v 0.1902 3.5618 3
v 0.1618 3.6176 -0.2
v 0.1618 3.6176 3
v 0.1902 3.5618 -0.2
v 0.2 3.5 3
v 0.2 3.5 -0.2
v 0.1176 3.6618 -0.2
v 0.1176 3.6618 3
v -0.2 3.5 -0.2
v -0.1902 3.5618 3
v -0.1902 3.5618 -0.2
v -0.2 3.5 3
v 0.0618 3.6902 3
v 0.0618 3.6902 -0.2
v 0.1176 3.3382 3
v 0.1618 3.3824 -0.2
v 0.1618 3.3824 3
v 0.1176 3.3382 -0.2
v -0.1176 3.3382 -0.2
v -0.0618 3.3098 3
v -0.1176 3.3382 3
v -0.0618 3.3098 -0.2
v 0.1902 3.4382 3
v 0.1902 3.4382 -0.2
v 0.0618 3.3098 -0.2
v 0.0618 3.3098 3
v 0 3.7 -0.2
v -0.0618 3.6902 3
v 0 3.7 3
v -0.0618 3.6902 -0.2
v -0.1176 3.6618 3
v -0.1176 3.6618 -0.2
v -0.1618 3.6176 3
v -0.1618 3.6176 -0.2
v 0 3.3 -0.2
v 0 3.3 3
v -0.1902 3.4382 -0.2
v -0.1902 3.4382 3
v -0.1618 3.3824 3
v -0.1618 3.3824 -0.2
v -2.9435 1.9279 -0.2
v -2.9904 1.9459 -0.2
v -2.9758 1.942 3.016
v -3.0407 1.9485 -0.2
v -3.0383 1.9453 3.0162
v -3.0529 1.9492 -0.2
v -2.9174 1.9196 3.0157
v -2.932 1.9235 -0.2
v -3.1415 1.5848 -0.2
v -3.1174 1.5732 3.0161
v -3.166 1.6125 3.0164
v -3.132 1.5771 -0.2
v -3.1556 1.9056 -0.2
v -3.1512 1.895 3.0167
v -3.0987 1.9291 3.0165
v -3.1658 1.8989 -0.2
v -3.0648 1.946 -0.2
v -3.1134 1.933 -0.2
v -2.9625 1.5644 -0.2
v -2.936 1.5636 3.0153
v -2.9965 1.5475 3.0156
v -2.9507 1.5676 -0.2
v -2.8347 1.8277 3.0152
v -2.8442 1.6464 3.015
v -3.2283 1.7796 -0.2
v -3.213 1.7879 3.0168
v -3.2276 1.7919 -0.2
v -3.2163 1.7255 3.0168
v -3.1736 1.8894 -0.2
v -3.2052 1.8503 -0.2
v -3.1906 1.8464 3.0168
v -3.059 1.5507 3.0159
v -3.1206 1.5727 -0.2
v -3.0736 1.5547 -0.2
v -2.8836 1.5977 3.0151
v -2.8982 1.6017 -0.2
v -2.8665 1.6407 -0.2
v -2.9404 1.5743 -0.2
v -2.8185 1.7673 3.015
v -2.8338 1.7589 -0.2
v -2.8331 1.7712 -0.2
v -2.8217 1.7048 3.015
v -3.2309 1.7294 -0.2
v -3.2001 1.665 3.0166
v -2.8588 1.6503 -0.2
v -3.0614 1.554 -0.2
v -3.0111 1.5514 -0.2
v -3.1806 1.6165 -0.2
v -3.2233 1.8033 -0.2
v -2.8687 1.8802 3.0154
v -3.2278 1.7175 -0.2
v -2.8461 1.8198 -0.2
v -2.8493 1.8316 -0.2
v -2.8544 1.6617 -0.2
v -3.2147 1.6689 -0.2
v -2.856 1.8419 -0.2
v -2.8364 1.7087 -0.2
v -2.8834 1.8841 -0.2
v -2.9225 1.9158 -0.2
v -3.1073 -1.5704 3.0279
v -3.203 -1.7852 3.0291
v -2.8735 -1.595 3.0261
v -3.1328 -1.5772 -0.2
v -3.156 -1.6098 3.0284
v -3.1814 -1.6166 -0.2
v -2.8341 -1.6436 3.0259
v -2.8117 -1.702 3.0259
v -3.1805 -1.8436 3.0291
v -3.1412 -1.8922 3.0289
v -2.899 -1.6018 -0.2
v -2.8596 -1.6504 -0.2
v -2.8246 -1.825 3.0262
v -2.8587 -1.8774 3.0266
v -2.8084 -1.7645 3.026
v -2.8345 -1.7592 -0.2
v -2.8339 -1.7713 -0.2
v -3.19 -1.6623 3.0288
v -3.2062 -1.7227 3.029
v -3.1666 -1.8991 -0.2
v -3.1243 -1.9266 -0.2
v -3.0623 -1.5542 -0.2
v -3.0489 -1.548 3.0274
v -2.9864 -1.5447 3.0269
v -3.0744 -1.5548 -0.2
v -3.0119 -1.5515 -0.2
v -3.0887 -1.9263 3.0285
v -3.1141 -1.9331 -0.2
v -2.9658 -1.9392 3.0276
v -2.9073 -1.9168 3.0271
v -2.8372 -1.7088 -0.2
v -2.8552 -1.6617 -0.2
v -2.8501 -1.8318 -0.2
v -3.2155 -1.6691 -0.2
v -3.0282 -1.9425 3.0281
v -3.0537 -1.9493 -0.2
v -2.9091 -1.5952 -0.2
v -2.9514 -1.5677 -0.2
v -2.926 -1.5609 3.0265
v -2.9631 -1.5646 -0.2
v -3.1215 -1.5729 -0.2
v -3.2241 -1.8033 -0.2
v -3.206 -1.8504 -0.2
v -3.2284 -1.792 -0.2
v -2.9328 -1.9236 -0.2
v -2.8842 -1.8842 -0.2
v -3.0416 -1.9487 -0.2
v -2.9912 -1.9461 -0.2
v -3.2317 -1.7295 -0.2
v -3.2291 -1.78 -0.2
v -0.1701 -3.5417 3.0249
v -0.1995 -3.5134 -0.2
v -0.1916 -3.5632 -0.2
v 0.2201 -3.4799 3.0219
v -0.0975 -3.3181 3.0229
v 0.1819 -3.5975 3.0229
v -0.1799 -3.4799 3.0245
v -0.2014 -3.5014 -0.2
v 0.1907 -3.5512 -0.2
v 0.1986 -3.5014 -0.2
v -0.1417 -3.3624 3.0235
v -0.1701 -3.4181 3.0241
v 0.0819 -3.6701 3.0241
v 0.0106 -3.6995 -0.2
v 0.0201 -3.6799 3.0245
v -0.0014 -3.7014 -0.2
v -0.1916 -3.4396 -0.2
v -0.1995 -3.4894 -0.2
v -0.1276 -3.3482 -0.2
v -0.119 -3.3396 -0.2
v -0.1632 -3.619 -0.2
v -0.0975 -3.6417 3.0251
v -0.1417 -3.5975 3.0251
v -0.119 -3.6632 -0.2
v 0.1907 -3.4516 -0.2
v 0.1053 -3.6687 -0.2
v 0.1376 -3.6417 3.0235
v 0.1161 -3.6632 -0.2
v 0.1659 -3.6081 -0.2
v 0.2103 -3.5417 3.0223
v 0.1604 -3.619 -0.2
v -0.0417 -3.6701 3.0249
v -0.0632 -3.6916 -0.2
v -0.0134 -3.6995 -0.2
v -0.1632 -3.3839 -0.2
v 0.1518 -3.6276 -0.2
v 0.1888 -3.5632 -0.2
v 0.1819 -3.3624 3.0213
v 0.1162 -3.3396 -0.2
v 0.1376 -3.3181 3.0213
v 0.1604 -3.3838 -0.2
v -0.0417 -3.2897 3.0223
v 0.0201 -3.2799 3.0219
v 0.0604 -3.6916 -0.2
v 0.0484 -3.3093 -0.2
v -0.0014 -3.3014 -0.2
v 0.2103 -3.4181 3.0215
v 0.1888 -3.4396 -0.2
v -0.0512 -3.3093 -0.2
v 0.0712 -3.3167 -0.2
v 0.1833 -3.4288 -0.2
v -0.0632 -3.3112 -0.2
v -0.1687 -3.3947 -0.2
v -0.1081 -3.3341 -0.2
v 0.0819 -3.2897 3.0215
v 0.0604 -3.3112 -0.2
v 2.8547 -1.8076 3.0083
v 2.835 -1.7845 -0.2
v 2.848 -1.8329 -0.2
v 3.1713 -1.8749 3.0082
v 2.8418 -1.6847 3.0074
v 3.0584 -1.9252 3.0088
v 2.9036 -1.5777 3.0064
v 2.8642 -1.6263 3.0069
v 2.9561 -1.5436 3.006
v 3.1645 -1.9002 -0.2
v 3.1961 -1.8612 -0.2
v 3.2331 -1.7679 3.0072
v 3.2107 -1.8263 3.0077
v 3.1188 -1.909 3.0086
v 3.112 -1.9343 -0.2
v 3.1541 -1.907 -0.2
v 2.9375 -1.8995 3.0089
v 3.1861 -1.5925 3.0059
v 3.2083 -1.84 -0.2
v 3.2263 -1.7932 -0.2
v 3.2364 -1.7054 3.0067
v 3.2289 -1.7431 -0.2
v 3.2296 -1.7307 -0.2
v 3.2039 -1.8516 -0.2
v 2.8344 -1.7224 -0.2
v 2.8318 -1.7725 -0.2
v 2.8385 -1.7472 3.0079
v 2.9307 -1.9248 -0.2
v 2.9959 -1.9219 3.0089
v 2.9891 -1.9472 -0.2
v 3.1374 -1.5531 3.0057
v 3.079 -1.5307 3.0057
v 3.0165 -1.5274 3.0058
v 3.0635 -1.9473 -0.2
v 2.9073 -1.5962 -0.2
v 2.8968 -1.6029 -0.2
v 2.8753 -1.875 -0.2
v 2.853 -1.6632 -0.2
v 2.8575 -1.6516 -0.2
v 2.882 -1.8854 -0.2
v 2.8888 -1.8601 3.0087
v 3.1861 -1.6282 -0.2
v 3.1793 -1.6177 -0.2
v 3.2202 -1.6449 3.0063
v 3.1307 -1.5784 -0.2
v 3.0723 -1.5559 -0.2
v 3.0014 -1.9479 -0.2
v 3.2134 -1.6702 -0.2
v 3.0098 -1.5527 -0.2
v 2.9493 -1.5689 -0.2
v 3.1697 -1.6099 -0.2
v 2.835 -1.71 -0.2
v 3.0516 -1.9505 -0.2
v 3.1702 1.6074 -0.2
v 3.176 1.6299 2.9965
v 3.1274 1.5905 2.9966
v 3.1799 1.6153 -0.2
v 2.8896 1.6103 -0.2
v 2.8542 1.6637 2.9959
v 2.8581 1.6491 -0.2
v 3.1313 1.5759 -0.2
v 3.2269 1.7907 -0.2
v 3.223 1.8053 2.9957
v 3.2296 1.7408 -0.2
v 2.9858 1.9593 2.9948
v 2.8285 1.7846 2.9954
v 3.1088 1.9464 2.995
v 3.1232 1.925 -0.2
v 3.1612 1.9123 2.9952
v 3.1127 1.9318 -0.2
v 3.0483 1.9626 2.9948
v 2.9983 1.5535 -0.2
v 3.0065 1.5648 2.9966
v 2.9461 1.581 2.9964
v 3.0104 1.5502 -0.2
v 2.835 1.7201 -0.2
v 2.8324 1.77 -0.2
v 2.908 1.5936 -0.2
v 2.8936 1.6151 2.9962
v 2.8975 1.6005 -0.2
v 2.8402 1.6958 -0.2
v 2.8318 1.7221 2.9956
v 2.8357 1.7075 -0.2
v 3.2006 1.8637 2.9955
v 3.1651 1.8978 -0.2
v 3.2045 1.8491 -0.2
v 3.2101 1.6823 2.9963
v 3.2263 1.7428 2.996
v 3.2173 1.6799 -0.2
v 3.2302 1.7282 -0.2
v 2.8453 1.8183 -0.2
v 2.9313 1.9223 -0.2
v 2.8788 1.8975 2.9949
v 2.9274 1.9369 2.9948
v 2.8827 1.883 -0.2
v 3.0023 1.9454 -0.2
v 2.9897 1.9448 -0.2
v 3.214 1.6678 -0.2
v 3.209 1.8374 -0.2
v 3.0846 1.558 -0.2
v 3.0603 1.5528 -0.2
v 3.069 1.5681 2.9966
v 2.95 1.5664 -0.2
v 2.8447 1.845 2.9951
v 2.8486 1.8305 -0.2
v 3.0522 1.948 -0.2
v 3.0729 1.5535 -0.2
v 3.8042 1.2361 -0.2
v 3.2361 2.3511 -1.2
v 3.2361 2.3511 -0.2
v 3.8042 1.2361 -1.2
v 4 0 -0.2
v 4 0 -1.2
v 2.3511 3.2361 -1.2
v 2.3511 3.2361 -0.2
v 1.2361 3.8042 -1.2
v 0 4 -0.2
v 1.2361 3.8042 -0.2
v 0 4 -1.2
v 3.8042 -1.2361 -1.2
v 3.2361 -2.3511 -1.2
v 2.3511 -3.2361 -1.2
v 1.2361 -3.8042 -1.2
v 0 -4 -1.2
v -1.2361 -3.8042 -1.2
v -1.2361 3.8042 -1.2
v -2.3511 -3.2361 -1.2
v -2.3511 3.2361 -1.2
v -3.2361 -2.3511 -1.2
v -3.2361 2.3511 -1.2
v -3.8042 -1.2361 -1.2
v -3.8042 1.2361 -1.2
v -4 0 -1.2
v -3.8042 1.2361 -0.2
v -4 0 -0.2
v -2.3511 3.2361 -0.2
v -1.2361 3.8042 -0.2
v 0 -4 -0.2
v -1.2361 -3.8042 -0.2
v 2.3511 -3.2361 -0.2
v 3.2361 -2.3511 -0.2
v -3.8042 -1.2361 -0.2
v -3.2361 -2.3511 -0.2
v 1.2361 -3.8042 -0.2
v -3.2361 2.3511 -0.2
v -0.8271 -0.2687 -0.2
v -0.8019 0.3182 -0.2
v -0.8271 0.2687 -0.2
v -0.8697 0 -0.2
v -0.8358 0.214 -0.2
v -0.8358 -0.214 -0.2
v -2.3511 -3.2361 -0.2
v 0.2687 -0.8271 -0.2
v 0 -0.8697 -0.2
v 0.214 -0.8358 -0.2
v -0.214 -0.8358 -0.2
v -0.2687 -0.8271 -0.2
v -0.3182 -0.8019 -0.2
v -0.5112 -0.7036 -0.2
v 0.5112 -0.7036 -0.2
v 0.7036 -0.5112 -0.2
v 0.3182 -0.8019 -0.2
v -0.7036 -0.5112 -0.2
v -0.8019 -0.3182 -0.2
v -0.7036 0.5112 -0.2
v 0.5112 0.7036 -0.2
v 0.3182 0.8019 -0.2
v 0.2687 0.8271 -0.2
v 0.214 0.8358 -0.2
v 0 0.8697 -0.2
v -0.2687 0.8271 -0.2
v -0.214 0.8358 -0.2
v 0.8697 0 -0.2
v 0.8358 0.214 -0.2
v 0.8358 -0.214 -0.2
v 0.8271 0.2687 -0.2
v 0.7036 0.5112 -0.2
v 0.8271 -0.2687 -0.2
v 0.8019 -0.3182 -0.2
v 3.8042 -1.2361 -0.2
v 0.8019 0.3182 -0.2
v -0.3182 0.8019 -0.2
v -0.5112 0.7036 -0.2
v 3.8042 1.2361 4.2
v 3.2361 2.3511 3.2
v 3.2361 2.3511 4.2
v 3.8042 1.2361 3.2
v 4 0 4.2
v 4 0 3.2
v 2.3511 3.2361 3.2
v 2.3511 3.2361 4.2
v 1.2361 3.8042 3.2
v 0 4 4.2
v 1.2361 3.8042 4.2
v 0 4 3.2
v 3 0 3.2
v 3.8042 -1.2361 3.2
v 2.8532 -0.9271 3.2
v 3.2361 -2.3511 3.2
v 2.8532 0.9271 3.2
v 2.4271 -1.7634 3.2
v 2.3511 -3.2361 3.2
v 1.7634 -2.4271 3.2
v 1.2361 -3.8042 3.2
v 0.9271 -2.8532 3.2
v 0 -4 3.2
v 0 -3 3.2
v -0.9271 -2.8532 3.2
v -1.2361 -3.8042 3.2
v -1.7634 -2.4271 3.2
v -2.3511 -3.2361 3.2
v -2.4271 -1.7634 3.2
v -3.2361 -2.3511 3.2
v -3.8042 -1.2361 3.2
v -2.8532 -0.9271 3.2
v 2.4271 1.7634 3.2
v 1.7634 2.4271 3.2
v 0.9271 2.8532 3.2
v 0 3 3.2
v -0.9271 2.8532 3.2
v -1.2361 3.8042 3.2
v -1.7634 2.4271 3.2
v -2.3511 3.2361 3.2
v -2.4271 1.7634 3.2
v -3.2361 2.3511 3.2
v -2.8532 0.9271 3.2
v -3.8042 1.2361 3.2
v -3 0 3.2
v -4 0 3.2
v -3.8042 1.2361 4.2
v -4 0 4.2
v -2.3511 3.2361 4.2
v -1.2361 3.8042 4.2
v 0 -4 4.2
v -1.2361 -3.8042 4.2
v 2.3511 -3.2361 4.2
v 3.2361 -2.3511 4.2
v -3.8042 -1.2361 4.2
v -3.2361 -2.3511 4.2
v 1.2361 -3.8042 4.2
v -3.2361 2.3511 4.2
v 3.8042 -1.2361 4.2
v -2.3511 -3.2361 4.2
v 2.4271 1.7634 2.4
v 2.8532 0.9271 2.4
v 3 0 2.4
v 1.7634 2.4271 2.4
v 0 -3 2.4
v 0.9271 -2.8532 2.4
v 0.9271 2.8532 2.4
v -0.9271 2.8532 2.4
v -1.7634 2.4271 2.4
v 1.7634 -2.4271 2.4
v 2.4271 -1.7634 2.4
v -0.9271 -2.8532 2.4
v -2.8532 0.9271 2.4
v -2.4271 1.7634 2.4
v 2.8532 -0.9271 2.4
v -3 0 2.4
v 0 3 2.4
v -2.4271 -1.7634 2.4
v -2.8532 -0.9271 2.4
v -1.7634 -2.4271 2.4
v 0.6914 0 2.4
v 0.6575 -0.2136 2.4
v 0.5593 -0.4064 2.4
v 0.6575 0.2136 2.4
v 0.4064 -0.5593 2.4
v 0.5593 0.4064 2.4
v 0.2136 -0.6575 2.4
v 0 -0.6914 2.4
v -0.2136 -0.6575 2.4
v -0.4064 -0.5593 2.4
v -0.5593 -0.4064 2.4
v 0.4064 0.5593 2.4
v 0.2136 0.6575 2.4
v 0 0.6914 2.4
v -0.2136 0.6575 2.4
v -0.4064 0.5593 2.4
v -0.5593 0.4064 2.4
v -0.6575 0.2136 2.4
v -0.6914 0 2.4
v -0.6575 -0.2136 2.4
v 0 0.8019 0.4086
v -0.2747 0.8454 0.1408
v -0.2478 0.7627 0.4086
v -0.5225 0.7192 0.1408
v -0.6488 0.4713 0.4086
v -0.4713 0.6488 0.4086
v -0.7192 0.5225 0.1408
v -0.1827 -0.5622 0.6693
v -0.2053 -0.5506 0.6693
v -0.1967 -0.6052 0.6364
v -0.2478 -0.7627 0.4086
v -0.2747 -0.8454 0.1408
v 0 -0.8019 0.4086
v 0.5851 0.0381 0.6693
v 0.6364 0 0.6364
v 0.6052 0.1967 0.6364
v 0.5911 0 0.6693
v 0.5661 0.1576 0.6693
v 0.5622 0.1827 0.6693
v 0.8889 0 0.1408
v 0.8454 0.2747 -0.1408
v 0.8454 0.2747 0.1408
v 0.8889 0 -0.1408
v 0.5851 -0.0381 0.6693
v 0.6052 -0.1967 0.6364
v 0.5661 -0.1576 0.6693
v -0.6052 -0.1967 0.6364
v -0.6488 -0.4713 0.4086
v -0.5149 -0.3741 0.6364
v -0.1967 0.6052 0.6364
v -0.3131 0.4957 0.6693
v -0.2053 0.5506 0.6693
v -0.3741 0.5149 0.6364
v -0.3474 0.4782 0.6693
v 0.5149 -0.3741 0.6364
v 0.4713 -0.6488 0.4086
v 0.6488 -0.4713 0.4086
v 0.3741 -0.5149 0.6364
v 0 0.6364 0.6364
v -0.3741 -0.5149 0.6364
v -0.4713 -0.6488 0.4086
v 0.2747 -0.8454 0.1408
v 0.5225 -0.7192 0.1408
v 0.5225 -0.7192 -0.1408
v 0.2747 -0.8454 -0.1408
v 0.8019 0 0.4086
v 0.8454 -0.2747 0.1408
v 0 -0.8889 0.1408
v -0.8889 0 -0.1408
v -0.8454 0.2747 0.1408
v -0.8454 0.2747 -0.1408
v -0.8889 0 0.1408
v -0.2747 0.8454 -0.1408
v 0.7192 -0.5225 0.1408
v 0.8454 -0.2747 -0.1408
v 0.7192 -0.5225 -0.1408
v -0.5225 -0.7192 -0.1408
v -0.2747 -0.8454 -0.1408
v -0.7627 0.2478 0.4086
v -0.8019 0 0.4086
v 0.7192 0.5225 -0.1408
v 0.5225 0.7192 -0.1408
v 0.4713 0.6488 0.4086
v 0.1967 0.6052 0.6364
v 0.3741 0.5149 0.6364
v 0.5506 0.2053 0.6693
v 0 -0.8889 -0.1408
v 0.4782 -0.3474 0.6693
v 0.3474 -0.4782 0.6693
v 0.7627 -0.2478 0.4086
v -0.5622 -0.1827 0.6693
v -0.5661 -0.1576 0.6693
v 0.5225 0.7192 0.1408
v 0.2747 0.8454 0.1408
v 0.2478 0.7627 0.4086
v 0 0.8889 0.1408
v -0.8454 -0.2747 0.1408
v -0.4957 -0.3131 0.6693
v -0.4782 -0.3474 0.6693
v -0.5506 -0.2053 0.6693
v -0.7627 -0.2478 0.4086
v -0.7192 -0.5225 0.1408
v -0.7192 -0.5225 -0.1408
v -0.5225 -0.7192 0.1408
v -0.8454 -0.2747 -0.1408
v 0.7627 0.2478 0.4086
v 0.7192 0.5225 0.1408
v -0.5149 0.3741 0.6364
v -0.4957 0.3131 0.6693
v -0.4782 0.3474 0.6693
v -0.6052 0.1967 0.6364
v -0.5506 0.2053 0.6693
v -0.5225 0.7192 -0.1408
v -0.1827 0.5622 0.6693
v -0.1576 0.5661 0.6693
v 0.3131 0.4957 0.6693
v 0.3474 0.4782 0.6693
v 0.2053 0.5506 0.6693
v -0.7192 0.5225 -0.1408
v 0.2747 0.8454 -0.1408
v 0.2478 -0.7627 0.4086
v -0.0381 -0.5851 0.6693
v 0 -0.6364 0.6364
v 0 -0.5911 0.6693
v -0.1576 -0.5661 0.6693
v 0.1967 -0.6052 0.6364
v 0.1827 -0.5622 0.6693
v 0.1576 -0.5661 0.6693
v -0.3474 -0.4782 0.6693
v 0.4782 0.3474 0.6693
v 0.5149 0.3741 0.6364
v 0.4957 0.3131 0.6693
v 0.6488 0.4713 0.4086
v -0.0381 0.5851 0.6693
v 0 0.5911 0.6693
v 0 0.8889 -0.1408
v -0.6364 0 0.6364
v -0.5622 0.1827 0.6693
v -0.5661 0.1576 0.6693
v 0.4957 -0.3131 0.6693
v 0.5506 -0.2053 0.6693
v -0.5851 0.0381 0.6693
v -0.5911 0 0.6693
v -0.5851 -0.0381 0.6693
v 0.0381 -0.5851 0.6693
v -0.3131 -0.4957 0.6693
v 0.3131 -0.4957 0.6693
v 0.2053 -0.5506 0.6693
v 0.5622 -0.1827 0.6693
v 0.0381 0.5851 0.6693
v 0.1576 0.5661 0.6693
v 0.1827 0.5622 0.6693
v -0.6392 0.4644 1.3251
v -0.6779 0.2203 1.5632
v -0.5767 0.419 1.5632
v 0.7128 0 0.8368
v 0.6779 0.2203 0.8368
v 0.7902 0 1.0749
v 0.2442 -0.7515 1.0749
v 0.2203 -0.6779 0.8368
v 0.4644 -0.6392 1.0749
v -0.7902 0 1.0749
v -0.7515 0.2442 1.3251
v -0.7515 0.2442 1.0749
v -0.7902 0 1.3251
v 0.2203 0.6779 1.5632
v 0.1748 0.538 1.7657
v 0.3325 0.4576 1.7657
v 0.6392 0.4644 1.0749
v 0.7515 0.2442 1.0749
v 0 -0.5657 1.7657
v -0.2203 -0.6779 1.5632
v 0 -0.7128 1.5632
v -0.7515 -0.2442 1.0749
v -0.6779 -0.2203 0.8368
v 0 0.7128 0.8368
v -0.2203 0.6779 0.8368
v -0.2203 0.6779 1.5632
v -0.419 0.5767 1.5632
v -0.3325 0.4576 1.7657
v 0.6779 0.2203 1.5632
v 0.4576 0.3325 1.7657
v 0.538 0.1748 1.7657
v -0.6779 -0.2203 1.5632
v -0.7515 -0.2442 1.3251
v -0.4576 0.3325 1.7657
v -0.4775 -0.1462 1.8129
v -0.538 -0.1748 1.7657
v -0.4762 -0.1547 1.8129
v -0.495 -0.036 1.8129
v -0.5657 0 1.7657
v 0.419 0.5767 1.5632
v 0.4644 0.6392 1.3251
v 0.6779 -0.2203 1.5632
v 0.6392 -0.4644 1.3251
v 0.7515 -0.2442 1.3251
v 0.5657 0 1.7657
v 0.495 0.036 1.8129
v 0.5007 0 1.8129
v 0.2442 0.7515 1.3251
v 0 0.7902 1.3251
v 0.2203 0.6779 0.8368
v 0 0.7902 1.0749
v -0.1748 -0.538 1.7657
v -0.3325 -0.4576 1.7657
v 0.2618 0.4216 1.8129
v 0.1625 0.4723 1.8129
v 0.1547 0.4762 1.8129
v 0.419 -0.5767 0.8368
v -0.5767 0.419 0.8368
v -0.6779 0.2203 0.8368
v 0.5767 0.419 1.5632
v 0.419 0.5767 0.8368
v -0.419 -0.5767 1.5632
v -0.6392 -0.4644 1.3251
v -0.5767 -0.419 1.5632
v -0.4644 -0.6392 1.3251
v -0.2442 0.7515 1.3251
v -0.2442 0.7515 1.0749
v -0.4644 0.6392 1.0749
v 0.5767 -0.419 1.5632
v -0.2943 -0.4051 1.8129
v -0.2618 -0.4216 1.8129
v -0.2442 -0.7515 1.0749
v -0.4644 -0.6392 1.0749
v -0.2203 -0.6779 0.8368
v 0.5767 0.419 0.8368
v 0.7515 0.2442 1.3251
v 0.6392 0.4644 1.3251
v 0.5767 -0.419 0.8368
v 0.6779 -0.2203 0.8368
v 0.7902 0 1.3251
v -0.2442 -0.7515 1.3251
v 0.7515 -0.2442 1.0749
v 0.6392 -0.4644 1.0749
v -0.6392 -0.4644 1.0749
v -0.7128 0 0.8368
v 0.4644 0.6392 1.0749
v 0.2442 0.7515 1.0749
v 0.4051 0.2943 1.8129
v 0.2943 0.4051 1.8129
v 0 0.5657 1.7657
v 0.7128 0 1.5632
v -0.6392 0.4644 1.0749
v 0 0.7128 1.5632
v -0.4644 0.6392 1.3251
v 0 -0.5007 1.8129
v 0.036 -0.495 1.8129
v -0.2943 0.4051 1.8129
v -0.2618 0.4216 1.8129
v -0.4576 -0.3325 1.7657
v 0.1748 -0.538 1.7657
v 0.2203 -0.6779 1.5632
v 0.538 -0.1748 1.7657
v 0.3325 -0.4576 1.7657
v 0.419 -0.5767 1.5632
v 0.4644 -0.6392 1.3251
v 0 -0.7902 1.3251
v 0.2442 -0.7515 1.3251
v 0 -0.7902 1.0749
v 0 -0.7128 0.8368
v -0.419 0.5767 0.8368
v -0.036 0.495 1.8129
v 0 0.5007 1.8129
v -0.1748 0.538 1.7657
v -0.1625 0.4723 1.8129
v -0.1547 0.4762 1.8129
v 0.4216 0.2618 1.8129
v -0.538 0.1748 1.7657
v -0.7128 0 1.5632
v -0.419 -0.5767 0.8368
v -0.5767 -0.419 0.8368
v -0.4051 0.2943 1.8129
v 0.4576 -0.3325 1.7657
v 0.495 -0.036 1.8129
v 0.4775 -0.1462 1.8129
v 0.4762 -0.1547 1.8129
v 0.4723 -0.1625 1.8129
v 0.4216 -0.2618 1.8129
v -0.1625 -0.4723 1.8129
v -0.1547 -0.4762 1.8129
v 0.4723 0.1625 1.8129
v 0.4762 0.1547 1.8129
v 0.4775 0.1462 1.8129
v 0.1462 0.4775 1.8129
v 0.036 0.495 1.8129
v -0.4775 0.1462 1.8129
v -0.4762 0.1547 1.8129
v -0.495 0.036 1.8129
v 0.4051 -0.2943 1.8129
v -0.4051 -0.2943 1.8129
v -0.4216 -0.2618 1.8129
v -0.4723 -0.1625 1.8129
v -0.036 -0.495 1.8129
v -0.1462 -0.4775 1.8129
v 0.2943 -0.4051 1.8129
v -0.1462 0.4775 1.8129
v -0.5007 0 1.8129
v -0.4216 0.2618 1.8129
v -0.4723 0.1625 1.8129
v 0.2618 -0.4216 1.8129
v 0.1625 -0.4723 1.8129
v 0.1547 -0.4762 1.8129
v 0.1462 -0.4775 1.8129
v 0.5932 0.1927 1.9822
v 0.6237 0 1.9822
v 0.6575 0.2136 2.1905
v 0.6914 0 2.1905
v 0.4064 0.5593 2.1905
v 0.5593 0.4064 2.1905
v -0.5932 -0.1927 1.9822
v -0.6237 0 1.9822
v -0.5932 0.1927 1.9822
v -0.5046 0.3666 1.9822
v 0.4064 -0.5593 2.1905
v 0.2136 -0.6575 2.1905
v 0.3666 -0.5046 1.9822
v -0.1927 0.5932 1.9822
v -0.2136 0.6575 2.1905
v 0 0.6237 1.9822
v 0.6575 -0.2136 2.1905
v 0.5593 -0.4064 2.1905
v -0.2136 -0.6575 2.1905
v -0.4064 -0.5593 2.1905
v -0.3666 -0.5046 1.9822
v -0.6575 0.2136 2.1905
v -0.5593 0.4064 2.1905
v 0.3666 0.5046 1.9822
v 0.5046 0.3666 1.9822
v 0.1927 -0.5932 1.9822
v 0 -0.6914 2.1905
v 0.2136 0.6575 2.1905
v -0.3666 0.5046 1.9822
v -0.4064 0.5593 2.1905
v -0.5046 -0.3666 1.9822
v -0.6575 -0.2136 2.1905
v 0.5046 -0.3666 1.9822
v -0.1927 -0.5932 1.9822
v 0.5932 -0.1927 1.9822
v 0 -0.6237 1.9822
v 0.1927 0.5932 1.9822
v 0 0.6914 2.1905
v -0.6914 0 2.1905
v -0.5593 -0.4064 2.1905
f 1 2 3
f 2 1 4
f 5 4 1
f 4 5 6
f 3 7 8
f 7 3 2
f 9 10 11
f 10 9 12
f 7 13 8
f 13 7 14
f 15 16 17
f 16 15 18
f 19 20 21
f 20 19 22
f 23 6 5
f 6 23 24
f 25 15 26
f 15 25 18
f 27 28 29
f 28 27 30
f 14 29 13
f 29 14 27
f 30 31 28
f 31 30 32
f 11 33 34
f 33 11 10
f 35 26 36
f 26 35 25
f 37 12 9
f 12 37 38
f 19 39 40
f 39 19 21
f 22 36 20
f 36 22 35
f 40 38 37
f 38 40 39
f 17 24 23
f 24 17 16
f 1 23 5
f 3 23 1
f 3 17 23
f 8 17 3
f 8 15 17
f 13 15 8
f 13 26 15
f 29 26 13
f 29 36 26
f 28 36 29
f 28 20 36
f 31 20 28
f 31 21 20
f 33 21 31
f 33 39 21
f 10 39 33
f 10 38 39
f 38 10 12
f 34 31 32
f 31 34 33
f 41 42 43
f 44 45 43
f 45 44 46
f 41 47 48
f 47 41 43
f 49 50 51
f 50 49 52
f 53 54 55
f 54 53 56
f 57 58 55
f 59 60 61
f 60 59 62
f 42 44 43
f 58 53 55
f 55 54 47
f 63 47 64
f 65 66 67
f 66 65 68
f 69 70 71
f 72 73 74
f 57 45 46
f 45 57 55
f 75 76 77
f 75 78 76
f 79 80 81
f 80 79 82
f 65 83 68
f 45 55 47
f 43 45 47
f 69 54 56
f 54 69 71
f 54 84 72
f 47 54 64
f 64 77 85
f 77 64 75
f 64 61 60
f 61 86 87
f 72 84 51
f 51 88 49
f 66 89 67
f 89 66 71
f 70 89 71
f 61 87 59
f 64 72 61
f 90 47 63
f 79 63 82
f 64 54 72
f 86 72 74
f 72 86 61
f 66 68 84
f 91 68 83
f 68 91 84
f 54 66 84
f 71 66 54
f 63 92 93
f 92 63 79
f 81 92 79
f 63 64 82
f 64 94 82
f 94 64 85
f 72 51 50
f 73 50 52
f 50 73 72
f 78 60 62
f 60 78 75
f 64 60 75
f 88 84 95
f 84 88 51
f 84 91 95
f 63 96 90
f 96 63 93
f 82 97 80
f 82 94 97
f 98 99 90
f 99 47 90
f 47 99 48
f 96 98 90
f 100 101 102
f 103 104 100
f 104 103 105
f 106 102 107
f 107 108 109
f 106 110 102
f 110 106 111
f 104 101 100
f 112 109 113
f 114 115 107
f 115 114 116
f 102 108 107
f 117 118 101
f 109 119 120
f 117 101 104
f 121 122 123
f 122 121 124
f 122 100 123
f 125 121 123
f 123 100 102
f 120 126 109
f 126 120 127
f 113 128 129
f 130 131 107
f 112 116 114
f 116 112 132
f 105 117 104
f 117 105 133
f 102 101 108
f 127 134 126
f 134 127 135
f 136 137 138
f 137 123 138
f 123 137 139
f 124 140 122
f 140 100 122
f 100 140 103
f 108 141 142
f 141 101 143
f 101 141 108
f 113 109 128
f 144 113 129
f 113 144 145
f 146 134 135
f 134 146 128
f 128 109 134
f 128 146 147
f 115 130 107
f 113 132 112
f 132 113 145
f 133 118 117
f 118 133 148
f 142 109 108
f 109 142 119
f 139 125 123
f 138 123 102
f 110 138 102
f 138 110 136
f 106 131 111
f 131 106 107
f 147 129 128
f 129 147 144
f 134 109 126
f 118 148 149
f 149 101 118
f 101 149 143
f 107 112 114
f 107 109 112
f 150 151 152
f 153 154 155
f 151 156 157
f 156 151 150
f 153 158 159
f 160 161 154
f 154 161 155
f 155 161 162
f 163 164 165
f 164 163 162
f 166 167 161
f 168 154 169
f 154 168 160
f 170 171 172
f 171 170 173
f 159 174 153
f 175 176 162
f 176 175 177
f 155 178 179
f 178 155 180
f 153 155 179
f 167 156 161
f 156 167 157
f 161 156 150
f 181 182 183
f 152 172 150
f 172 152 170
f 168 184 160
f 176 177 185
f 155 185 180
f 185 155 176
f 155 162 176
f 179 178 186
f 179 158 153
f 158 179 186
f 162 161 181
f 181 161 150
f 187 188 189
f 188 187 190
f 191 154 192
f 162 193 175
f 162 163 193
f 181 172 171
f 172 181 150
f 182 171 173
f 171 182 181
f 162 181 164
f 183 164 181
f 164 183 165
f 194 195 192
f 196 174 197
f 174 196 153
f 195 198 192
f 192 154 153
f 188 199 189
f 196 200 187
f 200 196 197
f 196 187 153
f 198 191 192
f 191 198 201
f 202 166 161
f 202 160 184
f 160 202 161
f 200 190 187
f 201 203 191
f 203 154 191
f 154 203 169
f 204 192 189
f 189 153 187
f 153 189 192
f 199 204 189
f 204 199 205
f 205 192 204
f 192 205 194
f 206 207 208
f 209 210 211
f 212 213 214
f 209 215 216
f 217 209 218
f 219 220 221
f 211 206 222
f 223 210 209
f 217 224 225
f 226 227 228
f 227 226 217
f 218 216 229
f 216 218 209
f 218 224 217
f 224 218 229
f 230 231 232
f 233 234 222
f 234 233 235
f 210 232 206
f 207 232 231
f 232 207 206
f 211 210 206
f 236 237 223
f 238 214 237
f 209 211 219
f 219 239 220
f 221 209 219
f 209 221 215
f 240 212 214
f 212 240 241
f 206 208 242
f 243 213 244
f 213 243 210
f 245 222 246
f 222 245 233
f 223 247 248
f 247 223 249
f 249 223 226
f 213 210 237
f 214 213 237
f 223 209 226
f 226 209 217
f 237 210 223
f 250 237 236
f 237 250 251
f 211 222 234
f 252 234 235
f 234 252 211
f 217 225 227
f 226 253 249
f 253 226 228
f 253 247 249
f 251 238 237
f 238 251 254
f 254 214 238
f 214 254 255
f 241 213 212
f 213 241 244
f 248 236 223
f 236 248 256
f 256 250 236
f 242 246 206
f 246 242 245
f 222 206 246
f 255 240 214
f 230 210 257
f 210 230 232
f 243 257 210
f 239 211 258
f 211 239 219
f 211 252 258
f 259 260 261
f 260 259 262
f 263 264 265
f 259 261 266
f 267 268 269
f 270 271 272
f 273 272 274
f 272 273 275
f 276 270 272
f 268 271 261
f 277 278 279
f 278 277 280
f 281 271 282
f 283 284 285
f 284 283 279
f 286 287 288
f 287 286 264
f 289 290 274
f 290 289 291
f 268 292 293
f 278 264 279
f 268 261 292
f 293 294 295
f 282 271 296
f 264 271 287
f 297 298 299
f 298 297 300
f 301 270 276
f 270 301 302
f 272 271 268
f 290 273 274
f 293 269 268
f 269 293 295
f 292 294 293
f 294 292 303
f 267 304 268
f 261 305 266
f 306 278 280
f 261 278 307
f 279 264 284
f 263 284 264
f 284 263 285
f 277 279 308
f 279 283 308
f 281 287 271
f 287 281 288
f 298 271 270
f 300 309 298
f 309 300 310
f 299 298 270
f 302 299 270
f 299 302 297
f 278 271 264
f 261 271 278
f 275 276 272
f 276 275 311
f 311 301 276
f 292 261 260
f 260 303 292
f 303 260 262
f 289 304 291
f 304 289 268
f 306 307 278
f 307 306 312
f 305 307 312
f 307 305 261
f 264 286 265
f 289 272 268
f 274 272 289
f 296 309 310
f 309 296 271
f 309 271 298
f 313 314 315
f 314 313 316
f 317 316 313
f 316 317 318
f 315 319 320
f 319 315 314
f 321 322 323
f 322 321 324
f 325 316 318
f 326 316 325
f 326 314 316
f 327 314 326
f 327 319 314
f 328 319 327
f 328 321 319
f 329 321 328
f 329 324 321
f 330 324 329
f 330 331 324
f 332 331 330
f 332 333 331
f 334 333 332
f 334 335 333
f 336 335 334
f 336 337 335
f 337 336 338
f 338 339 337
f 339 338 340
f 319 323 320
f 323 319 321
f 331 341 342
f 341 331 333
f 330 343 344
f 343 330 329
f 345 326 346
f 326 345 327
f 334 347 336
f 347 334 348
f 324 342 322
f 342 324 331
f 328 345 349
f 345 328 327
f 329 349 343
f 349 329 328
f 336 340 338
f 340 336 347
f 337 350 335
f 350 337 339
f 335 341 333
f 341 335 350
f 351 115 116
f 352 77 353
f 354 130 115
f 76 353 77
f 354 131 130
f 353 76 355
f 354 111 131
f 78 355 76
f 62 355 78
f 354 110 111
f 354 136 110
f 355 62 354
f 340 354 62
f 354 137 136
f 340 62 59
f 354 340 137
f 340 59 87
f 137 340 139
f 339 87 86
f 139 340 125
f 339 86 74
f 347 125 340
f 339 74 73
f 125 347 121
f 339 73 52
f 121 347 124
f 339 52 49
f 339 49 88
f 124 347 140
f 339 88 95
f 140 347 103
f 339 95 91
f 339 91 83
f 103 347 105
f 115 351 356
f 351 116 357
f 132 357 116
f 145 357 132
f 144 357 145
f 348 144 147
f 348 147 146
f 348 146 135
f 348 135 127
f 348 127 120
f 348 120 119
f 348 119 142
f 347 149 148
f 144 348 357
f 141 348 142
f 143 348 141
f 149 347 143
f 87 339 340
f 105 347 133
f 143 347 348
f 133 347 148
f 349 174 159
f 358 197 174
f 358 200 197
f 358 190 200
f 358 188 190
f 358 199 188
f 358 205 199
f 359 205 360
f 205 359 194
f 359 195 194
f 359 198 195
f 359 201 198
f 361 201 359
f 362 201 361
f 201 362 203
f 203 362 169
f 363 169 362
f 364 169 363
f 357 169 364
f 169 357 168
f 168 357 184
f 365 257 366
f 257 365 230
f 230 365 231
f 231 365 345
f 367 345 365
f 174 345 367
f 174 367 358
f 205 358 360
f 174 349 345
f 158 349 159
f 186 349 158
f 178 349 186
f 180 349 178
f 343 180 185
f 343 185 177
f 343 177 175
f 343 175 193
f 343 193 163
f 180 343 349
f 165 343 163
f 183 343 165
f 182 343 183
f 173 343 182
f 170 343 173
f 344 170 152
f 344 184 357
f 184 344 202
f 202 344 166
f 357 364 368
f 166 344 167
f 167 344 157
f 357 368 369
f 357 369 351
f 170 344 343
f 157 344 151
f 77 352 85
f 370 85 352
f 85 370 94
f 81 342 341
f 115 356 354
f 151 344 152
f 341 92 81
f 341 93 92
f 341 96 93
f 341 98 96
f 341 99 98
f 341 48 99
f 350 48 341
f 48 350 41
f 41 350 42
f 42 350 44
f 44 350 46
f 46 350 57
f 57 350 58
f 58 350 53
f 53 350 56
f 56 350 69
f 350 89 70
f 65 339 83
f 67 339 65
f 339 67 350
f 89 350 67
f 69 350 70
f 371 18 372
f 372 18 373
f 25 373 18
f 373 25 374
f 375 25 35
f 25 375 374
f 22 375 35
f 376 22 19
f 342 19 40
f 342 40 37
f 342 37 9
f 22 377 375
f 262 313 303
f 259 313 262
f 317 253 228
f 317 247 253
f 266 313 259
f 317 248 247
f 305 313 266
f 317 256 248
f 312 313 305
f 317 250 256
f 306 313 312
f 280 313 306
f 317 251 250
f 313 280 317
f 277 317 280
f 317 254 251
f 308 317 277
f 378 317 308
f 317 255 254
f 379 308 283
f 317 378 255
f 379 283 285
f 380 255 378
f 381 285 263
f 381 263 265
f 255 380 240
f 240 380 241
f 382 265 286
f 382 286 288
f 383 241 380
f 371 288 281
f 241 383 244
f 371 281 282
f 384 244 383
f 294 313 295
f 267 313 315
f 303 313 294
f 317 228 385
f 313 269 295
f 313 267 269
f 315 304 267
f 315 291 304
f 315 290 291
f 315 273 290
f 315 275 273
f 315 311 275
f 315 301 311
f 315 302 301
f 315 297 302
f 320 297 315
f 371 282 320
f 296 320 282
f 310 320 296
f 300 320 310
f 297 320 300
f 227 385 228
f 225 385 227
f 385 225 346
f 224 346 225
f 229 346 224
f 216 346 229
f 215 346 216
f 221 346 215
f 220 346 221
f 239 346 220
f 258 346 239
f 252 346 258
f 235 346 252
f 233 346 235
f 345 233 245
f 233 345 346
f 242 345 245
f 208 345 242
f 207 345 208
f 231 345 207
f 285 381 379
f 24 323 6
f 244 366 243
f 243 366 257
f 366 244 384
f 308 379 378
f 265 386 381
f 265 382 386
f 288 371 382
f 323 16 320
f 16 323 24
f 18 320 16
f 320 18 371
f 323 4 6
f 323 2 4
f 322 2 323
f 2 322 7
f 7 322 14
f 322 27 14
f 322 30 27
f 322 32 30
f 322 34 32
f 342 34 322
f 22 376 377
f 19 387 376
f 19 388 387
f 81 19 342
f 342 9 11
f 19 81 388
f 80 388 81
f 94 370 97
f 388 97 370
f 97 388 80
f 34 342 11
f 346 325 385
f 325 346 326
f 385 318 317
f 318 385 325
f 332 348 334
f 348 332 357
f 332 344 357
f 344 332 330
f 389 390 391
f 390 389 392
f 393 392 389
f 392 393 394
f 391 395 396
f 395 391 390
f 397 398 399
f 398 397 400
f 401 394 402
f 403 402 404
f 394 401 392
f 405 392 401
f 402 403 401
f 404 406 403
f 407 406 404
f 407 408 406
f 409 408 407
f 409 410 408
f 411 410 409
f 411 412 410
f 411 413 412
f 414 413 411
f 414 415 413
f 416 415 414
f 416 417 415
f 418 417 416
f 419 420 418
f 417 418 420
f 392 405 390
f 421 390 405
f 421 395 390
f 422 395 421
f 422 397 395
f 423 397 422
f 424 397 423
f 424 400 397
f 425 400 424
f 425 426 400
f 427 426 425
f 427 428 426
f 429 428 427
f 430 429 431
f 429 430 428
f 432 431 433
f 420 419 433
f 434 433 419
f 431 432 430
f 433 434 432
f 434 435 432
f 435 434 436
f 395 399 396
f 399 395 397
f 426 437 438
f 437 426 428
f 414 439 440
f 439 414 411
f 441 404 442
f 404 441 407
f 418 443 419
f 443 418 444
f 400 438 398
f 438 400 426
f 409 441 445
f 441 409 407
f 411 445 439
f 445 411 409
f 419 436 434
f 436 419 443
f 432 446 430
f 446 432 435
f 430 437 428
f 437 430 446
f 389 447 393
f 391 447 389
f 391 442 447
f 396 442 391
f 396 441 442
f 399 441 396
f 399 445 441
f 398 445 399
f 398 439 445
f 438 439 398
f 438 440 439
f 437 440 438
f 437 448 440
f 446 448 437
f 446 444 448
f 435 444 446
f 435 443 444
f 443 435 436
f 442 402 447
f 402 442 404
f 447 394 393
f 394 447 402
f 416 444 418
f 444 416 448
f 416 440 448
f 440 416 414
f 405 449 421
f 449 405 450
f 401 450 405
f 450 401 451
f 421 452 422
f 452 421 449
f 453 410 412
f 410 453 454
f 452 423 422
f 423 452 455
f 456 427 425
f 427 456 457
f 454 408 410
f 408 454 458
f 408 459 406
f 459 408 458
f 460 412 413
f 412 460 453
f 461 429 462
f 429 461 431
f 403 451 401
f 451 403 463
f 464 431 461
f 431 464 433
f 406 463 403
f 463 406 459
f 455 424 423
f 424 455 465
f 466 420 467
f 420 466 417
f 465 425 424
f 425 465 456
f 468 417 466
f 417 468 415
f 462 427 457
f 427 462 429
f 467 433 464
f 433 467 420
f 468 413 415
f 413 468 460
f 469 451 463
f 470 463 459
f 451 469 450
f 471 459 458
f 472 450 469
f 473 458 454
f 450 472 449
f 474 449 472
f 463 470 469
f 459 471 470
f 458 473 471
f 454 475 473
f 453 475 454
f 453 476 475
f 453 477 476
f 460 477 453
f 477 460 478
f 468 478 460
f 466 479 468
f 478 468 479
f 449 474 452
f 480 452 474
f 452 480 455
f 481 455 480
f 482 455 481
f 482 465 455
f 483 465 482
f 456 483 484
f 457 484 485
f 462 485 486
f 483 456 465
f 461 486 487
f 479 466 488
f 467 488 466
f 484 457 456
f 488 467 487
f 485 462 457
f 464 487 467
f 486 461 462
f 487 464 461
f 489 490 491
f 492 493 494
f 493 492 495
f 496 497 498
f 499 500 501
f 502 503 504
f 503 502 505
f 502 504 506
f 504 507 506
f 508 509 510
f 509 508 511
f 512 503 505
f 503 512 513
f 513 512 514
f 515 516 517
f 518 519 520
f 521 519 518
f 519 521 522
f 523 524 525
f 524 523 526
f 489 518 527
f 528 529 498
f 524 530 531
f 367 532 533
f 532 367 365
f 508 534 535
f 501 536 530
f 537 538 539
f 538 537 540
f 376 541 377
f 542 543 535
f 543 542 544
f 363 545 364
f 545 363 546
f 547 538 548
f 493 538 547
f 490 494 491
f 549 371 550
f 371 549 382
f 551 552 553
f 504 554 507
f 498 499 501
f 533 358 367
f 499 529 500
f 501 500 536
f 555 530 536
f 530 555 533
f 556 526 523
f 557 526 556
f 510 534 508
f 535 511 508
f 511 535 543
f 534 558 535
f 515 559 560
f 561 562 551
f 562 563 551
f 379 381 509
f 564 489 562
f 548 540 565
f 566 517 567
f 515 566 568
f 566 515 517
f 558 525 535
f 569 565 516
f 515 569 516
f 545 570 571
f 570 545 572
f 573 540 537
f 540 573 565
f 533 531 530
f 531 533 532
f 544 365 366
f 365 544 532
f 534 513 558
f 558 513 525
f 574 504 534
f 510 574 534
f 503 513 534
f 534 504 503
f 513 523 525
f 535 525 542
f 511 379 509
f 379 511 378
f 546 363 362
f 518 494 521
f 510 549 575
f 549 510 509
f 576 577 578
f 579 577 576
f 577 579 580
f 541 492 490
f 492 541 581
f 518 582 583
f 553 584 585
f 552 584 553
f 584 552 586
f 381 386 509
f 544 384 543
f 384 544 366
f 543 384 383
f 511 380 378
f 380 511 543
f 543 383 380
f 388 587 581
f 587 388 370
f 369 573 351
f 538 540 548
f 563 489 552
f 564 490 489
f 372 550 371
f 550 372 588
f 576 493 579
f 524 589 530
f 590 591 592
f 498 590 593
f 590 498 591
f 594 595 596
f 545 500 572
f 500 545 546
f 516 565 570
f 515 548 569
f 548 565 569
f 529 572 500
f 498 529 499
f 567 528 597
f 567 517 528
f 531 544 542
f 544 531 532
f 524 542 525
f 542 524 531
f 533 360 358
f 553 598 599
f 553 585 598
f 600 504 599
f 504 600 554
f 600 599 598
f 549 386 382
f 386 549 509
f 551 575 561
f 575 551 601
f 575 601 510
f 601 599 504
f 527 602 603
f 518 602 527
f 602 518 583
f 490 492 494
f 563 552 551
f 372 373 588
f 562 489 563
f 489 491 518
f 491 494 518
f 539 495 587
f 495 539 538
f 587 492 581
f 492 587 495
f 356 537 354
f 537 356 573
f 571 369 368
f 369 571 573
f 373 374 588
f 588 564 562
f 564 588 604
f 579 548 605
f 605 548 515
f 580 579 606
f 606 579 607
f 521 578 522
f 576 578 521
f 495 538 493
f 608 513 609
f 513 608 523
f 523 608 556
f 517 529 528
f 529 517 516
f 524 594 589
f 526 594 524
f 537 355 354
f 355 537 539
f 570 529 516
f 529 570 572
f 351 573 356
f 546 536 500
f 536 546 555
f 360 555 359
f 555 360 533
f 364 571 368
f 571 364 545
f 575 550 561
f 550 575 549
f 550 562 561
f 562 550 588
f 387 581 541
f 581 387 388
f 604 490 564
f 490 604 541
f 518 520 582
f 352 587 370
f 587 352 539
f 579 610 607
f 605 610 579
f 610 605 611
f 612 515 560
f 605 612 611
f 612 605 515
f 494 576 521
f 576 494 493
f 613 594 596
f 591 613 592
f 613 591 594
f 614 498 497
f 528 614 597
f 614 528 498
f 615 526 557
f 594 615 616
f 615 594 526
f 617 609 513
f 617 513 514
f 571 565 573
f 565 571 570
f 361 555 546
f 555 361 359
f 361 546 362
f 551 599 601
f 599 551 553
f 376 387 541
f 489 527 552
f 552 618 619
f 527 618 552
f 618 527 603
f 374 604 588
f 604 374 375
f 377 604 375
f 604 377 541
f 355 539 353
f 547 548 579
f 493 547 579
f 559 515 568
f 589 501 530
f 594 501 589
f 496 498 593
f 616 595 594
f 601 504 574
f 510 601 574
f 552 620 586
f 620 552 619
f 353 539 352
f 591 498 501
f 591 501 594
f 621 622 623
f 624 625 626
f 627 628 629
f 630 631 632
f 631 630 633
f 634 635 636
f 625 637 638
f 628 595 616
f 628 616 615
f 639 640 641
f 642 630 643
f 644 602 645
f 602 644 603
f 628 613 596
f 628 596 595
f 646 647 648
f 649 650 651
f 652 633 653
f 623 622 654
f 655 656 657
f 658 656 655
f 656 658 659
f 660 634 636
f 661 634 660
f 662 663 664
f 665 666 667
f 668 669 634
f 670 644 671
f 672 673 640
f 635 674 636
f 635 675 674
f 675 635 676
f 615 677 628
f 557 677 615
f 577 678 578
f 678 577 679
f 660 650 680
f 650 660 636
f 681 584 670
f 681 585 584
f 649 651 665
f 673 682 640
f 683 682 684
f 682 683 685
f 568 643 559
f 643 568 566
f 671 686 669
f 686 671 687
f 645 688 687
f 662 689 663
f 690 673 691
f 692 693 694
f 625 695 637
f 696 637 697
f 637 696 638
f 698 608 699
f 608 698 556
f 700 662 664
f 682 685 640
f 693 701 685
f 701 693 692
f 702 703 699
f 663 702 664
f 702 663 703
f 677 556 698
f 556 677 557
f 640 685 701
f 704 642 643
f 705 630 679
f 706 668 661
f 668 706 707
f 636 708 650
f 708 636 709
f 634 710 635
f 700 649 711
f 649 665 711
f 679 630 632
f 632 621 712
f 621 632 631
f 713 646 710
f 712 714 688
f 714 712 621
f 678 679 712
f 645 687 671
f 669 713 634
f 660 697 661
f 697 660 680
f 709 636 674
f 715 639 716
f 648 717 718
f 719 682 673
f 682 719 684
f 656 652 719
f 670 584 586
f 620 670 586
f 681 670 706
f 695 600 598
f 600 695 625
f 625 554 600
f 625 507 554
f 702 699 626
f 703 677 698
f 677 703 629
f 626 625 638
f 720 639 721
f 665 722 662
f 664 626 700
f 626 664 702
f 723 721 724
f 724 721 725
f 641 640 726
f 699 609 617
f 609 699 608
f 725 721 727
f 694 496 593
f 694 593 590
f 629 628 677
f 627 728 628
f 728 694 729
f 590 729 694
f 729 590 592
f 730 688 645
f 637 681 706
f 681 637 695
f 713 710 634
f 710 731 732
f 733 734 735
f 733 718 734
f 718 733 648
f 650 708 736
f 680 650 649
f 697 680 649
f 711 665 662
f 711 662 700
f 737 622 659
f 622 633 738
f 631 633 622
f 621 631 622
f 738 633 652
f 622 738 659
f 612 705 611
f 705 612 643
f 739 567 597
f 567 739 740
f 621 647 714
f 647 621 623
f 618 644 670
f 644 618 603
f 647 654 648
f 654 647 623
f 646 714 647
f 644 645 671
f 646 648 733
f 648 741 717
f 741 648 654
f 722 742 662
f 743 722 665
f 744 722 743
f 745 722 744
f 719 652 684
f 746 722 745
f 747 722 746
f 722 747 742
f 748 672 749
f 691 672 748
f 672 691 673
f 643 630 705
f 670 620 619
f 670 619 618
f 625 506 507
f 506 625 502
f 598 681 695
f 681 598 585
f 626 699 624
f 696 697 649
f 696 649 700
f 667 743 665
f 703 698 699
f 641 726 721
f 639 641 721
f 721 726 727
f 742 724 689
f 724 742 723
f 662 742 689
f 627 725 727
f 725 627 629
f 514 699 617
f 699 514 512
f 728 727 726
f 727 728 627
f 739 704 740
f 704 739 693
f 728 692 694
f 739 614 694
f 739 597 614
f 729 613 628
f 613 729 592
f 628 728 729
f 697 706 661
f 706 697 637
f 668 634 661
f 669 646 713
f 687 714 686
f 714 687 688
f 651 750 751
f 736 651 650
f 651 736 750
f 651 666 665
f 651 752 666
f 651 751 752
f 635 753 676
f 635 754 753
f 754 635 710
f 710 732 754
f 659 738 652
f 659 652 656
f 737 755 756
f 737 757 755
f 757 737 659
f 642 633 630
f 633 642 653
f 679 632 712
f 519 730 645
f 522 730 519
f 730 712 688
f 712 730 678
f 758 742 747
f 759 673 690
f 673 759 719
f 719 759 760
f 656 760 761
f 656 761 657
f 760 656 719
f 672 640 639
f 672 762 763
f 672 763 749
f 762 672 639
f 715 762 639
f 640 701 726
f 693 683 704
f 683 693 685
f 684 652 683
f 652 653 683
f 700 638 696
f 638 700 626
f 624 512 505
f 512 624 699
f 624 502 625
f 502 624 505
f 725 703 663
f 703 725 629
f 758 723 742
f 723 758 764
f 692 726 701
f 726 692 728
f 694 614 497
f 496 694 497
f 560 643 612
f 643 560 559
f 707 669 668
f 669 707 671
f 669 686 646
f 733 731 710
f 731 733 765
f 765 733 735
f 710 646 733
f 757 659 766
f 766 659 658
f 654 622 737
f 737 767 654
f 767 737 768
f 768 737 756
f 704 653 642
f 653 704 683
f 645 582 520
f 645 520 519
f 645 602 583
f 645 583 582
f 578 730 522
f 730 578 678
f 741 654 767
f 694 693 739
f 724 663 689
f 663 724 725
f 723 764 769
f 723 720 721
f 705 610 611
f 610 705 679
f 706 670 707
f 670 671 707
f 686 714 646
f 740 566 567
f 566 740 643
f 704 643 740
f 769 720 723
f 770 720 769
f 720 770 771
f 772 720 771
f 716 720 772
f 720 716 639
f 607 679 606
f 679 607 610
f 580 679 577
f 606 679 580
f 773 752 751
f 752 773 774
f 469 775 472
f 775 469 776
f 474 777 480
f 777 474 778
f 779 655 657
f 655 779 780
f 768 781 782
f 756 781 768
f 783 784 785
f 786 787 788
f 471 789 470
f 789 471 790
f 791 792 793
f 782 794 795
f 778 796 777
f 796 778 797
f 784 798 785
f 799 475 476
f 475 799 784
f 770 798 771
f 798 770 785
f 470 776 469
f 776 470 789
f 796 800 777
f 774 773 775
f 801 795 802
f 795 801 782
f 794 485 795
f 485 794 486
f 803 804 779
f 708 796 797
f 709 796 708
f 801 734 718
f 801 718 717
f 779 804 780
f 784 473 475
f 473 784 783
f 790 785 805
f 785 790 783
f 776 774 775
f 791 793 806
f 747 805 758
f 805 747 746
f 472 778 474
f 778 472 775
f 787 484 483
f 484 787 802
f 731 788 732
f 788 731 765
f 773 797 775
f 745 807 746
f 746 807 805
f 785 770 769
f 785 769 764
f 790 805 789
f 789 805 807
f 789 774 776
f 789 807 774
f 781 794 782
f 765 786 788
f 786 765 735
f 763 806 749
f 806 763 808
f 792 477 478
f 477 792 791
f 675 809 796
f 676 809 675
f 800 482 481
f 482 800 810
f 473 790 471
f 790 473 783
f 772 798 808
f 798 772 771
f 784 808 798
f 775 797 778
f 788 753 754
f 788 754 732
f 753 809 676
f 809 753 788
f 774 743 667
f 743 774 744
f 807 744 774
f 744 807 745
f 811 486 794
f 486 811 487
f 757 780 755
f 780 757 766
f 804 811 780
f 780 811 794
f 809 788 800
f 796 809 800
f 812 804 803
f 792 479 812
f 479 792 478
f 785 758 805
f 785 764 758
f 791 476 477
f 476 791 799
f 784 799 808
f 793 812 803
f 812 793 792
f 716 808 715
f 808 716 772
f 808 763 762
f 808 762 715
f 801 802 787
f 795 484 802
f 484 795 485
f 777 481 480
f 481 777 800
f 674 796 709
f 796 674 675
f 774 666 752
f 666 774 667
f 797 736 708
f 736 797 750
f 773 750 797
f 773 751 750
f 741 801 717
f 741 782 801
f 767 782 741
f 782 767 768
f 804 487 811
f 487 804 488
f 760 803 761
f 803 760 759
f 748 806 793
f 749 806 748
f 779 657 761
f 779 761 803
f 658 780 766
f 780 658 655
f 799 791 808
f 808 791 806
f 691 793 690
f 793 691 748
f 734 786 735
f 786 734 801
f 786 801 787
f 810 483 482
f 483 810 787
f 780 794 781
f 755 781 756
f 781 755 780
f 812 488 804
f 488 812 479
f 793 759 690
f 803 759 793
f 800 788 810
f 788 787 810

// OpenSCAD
//sphere(2, $fn=20);

$fn=20;

translate([0,0,-1.2]) cylinder(h=1, r=4);


translate([0,0,3.2]) cylinder(h=1, r=4);
translate([0,0,2.4]) cylinder(1.5,3,3);




sphere(.9);
translate([0,0,1.2]) sphere(.8);
translate([0,0,2.3]) sphere(.7);
translate([0,0,3.2]) sphere(.6);
//translate([0,0,4.1]) sphere(.5);
//translate([0,0,4.8]) sphere(.4);
//translate([0,0,5.4]) sphere(.3);
//translate([0,0,5.8]) sphere(.2);
//translate([0,0,6]) sphere(.1);


for ( i = [0 : 5] ) {
    rotate( i * 360 / 6, [1, 1, 300])
    translate([0, 3.5, -1])
   	cylinder(4,.2,.2);
}
